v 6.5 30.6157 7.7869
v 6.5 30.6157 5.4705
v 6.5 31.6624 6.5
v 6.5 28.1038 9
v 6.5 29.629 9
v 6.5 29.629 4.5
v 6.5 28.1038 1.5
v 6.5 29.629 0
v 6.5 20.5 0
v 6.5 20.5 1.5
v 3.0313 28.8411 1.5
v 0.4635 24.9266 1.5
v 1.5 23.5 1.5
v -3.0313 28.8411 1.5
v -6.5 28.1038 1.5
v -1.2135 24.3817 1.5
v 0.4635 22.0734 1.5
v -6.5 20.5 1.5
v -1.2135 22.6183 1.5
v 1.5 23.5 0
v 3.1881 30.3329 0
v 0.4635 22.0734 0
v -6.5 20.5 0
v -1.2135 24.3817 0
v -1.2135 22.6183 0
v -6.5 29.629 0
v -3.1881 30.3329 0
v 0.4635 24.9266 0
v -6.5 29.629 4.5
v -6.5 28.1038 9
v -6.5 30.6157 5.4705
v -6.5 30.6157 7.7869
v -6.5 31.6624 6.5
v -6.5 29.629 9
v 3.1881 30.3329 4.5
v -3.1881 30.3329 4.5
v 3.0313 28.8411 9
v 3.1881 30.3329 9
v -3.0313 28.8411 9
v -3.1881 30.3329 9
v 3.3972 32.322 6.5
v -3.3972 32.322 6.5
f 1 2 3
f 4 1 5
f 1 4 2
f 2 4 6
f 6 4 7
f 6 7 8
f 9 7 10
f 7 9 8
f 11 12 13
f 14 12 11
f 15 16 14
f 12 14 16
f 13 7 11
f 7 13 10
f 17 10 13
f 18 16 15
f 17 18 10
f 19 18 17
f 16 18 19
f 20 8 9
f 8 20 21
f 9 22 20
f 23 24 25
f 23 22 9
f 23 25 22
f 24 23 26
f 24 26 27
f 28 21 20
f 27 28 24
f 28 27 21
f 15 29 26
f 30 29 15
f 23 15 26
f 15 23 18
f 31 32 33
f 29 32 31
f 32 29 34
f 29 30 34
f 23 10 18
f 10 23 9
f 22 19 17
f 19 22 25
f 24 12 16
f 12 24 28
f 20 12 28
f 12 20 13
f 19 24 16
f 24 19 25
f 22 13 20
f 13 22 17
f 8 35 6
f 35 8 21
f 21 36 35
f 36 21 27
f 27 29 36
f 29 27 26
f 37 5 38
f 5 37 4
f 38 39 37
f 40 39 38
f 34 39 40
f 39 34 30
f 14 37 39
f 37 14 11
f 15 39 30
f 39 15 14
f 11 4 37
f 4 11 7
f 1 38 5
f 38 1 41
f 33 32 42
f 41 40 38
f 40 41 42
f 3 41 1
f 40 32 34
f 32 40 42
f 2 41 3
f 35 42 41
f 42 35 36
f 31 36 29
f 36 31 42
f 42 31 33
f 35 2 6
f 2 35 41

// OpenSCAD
outer_cap_dia = 58; // Outer diameter of a cap
base_cap_height = 1.5;
thickness = 1.5;
connector_height = 9;
connector_hole_dia = 3; // Dia of the connector hole
connector_hole_offset = 3;
connector_size = 8.5;
lock_holder_width = 13;
lock_pin_size = 2;

//horizontal body
difference()
{
    translate([-lock_holder_width / 2, outer_cap_dia / 2 - connector_size, 0])
    {
        cube([lock_holder_width, connector_size, base_cap_height]);
    }
    translate([0, outer_cap_dia / 2 - connector_size + connector_hole_offset, 0])
    {
        cylinder(h = base_cap_height, r = connector_hole_dia / 2);
    }
}
//vertical body
intersection()
{   
    translate([-lock_holder_width / 2, 0, 0])
    {
        cube([lock_holder_width, outer_cap_dia, connector_height]);
    }
    union()
    {
        difference()
        {
            cylinder(h = connector_height, r = outer_cap_dia / 2 + thickness);
            cylinder(h = connector_height, r = outer_cap_dia / 2);
        }
        translate([0, 0, connector_height - 2.5])
        {
            difference()
            {
                cylinder(h = 2.5, r = (outer_cap_dia / 2 - 2.5));
                cylinder(h = 2.5, r2 = (outer_cap_dia / 2 - 2.5), r1 = (outer_cap_dia / 2 - 1));
            }
        }
        
        //locking body
        difference()
        {
            union()
            {
                translate([0, 0, connector_height - 1.5 - 1])
                {
                    cylinder(h = 2.5, r2 = (outer_cap_dia / 2 + thickness), r1 = (outer_cap_dia / 2 + thickness + lock_pin_size));
                }
                translate([0, 0, connector_height - 3.5 - 1])
                {
                    cylinder(h = 2, r1 = (outer_cap_dia / 2 + thickness), r2 = (outer_cap_dia / 2 + thickness + lock_pin_size));
                }
            }
            cylinder(h = connector_height, r = outer_cap_dia / 2);
        }
    }
}
